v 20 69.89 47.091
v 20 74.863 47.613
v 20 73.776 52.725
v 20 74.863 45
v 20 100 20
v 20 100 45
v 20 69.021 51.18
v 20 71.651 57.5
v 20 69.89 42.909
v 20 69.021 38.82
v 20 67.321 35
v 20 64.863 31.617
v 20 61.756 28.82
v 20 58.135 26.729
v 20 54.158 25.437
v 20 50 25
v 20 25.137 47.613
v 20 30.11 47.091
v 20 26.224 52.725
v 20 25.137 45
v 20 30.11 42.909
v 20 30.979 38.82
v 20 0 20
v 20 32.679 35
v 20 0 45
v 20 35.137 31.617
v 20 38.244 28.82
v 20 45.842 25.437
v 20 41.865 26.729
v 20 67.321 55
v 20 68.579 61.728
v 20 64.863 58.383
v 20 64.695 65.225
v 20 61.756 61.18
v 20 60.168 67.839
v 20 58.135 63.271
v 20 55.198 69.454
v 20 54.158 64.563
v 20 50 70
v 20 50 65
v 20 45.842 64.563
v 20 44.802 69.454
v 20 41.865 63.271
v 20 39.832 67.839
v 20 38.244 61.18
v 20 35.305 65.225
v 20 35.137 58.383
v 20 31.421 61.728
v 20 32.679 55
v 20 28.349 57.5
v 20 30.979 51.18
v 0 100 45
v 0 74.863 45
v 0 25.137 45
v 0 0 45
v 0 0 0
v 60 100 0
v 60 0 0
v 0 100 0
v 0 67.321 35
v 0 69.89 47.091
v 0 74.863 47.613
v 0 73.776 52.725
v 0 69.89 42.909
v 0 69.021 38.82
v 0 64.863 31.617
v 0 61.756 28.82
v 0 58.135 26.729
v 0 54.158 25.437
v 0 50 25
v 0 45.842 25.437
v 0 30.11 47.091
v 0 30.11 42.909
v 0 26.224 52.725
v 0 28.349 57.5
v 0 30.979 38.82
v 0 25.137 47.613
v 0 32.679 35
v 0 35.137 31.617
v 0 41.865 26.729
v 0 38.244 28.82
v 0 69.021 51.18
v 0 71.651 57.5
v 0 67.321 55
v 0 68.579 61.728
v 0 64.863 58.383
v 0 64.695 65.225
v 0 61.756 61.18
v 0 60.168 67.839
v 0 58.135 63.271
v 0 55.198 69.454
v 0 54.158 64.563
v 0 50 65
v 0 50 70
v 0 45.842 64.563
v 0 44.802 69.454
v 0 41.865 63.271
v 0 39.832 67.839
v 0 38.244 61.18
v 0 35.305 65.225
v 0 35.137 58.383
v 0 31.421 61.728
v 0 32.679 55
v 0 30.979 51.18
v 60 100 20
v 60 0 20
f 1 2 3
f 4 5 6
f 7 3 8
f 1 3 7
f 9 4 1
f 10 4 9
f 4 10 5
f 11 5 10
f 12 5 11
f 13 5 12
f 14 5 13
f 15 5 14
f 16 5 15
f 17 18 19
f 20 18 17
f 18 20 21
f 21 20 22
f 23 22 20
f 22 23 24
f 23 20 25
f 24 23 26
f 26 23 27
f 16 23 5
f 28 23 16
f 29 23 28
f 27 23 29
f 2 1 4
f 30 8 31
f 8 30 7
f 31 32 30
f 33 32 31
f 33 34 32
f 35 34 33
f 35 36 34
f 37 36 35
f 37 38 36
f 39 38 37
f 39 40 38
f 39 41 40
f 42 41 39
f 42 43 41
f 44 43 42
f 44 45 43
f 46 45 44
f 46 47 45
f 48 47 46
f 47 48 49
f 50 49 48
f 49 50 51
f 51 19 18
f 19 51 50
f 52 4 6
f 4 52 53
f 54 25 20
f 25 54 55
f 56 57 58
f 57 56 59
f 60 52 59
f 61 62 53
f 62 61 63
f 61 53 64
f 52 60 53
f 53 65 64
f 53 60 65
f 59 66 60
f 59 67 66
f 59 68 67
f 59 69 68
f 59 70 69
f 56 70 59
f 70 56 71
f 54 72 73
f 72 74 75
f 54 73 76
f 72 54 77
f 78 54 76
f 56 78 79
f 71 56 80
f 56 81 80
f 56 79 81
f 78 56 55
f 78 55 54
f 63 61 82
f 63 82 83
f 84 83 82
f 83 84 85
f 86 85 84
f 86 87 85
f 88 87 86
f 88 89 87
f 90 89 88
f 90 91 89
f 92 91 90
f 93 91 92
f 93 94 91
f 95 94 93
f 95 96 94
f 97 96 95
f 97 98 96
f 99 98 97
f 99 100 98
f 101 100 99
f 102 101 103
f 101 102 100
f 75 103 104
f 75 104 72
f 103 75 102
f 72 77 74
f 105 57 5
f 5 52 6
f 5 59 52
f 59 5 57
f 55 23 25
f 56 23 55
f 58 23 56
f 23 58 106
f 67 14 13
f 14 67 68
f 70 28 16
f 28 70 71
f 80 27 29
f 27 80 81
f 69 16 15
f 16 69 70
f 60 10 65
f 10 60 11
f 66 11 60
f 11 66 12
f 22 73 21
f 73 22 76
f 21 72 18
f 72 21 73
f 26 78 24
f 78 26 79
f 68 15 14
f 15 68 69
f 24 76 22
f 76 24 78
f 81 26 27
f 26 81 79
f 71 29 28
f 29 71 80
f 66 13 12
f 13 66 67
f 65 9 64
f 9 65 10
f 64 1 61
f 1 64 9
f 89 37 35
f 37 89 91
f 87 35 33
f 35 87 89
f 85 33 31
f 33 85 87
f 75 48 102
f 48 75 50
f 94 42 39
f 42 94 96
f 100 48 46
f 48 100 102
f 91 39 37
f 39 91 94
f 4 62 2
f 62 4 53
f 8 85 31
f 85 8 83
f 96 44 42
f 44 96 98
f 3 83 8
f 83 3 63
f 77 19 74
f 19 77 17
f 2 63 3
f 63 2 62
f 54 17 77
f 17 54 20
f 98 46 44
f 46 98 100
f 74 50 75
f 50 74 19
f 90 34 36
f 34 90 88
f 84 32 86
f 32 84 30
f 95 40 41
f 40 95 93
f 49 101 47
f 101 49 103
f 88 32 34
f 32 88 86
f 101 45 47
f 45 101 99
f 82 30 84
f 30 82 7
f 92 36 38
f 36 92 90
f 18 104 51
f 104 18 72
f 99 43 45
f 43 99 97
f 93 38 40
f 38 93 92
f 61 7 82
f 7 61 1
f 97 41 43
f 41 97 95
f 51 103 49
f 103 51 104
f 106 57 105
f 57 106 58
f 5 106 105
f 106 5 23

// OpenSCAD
// la base
cube([60,100,20]);

// la pared vertical y un trozo de hoyo
difference(){
    cube([20,100,45]);
    
    translate([-1,50,45])
    rotate([0,90,0])
    cylinder(22,d=40);
}
difference(){
    translate([0,50,45])
    rotate([0,90,0])
    cylinder(20,d=50);
   
    translate([-1,50,45])
    rotate([0,90,0])
    cylinder(22,d=40);
}   
